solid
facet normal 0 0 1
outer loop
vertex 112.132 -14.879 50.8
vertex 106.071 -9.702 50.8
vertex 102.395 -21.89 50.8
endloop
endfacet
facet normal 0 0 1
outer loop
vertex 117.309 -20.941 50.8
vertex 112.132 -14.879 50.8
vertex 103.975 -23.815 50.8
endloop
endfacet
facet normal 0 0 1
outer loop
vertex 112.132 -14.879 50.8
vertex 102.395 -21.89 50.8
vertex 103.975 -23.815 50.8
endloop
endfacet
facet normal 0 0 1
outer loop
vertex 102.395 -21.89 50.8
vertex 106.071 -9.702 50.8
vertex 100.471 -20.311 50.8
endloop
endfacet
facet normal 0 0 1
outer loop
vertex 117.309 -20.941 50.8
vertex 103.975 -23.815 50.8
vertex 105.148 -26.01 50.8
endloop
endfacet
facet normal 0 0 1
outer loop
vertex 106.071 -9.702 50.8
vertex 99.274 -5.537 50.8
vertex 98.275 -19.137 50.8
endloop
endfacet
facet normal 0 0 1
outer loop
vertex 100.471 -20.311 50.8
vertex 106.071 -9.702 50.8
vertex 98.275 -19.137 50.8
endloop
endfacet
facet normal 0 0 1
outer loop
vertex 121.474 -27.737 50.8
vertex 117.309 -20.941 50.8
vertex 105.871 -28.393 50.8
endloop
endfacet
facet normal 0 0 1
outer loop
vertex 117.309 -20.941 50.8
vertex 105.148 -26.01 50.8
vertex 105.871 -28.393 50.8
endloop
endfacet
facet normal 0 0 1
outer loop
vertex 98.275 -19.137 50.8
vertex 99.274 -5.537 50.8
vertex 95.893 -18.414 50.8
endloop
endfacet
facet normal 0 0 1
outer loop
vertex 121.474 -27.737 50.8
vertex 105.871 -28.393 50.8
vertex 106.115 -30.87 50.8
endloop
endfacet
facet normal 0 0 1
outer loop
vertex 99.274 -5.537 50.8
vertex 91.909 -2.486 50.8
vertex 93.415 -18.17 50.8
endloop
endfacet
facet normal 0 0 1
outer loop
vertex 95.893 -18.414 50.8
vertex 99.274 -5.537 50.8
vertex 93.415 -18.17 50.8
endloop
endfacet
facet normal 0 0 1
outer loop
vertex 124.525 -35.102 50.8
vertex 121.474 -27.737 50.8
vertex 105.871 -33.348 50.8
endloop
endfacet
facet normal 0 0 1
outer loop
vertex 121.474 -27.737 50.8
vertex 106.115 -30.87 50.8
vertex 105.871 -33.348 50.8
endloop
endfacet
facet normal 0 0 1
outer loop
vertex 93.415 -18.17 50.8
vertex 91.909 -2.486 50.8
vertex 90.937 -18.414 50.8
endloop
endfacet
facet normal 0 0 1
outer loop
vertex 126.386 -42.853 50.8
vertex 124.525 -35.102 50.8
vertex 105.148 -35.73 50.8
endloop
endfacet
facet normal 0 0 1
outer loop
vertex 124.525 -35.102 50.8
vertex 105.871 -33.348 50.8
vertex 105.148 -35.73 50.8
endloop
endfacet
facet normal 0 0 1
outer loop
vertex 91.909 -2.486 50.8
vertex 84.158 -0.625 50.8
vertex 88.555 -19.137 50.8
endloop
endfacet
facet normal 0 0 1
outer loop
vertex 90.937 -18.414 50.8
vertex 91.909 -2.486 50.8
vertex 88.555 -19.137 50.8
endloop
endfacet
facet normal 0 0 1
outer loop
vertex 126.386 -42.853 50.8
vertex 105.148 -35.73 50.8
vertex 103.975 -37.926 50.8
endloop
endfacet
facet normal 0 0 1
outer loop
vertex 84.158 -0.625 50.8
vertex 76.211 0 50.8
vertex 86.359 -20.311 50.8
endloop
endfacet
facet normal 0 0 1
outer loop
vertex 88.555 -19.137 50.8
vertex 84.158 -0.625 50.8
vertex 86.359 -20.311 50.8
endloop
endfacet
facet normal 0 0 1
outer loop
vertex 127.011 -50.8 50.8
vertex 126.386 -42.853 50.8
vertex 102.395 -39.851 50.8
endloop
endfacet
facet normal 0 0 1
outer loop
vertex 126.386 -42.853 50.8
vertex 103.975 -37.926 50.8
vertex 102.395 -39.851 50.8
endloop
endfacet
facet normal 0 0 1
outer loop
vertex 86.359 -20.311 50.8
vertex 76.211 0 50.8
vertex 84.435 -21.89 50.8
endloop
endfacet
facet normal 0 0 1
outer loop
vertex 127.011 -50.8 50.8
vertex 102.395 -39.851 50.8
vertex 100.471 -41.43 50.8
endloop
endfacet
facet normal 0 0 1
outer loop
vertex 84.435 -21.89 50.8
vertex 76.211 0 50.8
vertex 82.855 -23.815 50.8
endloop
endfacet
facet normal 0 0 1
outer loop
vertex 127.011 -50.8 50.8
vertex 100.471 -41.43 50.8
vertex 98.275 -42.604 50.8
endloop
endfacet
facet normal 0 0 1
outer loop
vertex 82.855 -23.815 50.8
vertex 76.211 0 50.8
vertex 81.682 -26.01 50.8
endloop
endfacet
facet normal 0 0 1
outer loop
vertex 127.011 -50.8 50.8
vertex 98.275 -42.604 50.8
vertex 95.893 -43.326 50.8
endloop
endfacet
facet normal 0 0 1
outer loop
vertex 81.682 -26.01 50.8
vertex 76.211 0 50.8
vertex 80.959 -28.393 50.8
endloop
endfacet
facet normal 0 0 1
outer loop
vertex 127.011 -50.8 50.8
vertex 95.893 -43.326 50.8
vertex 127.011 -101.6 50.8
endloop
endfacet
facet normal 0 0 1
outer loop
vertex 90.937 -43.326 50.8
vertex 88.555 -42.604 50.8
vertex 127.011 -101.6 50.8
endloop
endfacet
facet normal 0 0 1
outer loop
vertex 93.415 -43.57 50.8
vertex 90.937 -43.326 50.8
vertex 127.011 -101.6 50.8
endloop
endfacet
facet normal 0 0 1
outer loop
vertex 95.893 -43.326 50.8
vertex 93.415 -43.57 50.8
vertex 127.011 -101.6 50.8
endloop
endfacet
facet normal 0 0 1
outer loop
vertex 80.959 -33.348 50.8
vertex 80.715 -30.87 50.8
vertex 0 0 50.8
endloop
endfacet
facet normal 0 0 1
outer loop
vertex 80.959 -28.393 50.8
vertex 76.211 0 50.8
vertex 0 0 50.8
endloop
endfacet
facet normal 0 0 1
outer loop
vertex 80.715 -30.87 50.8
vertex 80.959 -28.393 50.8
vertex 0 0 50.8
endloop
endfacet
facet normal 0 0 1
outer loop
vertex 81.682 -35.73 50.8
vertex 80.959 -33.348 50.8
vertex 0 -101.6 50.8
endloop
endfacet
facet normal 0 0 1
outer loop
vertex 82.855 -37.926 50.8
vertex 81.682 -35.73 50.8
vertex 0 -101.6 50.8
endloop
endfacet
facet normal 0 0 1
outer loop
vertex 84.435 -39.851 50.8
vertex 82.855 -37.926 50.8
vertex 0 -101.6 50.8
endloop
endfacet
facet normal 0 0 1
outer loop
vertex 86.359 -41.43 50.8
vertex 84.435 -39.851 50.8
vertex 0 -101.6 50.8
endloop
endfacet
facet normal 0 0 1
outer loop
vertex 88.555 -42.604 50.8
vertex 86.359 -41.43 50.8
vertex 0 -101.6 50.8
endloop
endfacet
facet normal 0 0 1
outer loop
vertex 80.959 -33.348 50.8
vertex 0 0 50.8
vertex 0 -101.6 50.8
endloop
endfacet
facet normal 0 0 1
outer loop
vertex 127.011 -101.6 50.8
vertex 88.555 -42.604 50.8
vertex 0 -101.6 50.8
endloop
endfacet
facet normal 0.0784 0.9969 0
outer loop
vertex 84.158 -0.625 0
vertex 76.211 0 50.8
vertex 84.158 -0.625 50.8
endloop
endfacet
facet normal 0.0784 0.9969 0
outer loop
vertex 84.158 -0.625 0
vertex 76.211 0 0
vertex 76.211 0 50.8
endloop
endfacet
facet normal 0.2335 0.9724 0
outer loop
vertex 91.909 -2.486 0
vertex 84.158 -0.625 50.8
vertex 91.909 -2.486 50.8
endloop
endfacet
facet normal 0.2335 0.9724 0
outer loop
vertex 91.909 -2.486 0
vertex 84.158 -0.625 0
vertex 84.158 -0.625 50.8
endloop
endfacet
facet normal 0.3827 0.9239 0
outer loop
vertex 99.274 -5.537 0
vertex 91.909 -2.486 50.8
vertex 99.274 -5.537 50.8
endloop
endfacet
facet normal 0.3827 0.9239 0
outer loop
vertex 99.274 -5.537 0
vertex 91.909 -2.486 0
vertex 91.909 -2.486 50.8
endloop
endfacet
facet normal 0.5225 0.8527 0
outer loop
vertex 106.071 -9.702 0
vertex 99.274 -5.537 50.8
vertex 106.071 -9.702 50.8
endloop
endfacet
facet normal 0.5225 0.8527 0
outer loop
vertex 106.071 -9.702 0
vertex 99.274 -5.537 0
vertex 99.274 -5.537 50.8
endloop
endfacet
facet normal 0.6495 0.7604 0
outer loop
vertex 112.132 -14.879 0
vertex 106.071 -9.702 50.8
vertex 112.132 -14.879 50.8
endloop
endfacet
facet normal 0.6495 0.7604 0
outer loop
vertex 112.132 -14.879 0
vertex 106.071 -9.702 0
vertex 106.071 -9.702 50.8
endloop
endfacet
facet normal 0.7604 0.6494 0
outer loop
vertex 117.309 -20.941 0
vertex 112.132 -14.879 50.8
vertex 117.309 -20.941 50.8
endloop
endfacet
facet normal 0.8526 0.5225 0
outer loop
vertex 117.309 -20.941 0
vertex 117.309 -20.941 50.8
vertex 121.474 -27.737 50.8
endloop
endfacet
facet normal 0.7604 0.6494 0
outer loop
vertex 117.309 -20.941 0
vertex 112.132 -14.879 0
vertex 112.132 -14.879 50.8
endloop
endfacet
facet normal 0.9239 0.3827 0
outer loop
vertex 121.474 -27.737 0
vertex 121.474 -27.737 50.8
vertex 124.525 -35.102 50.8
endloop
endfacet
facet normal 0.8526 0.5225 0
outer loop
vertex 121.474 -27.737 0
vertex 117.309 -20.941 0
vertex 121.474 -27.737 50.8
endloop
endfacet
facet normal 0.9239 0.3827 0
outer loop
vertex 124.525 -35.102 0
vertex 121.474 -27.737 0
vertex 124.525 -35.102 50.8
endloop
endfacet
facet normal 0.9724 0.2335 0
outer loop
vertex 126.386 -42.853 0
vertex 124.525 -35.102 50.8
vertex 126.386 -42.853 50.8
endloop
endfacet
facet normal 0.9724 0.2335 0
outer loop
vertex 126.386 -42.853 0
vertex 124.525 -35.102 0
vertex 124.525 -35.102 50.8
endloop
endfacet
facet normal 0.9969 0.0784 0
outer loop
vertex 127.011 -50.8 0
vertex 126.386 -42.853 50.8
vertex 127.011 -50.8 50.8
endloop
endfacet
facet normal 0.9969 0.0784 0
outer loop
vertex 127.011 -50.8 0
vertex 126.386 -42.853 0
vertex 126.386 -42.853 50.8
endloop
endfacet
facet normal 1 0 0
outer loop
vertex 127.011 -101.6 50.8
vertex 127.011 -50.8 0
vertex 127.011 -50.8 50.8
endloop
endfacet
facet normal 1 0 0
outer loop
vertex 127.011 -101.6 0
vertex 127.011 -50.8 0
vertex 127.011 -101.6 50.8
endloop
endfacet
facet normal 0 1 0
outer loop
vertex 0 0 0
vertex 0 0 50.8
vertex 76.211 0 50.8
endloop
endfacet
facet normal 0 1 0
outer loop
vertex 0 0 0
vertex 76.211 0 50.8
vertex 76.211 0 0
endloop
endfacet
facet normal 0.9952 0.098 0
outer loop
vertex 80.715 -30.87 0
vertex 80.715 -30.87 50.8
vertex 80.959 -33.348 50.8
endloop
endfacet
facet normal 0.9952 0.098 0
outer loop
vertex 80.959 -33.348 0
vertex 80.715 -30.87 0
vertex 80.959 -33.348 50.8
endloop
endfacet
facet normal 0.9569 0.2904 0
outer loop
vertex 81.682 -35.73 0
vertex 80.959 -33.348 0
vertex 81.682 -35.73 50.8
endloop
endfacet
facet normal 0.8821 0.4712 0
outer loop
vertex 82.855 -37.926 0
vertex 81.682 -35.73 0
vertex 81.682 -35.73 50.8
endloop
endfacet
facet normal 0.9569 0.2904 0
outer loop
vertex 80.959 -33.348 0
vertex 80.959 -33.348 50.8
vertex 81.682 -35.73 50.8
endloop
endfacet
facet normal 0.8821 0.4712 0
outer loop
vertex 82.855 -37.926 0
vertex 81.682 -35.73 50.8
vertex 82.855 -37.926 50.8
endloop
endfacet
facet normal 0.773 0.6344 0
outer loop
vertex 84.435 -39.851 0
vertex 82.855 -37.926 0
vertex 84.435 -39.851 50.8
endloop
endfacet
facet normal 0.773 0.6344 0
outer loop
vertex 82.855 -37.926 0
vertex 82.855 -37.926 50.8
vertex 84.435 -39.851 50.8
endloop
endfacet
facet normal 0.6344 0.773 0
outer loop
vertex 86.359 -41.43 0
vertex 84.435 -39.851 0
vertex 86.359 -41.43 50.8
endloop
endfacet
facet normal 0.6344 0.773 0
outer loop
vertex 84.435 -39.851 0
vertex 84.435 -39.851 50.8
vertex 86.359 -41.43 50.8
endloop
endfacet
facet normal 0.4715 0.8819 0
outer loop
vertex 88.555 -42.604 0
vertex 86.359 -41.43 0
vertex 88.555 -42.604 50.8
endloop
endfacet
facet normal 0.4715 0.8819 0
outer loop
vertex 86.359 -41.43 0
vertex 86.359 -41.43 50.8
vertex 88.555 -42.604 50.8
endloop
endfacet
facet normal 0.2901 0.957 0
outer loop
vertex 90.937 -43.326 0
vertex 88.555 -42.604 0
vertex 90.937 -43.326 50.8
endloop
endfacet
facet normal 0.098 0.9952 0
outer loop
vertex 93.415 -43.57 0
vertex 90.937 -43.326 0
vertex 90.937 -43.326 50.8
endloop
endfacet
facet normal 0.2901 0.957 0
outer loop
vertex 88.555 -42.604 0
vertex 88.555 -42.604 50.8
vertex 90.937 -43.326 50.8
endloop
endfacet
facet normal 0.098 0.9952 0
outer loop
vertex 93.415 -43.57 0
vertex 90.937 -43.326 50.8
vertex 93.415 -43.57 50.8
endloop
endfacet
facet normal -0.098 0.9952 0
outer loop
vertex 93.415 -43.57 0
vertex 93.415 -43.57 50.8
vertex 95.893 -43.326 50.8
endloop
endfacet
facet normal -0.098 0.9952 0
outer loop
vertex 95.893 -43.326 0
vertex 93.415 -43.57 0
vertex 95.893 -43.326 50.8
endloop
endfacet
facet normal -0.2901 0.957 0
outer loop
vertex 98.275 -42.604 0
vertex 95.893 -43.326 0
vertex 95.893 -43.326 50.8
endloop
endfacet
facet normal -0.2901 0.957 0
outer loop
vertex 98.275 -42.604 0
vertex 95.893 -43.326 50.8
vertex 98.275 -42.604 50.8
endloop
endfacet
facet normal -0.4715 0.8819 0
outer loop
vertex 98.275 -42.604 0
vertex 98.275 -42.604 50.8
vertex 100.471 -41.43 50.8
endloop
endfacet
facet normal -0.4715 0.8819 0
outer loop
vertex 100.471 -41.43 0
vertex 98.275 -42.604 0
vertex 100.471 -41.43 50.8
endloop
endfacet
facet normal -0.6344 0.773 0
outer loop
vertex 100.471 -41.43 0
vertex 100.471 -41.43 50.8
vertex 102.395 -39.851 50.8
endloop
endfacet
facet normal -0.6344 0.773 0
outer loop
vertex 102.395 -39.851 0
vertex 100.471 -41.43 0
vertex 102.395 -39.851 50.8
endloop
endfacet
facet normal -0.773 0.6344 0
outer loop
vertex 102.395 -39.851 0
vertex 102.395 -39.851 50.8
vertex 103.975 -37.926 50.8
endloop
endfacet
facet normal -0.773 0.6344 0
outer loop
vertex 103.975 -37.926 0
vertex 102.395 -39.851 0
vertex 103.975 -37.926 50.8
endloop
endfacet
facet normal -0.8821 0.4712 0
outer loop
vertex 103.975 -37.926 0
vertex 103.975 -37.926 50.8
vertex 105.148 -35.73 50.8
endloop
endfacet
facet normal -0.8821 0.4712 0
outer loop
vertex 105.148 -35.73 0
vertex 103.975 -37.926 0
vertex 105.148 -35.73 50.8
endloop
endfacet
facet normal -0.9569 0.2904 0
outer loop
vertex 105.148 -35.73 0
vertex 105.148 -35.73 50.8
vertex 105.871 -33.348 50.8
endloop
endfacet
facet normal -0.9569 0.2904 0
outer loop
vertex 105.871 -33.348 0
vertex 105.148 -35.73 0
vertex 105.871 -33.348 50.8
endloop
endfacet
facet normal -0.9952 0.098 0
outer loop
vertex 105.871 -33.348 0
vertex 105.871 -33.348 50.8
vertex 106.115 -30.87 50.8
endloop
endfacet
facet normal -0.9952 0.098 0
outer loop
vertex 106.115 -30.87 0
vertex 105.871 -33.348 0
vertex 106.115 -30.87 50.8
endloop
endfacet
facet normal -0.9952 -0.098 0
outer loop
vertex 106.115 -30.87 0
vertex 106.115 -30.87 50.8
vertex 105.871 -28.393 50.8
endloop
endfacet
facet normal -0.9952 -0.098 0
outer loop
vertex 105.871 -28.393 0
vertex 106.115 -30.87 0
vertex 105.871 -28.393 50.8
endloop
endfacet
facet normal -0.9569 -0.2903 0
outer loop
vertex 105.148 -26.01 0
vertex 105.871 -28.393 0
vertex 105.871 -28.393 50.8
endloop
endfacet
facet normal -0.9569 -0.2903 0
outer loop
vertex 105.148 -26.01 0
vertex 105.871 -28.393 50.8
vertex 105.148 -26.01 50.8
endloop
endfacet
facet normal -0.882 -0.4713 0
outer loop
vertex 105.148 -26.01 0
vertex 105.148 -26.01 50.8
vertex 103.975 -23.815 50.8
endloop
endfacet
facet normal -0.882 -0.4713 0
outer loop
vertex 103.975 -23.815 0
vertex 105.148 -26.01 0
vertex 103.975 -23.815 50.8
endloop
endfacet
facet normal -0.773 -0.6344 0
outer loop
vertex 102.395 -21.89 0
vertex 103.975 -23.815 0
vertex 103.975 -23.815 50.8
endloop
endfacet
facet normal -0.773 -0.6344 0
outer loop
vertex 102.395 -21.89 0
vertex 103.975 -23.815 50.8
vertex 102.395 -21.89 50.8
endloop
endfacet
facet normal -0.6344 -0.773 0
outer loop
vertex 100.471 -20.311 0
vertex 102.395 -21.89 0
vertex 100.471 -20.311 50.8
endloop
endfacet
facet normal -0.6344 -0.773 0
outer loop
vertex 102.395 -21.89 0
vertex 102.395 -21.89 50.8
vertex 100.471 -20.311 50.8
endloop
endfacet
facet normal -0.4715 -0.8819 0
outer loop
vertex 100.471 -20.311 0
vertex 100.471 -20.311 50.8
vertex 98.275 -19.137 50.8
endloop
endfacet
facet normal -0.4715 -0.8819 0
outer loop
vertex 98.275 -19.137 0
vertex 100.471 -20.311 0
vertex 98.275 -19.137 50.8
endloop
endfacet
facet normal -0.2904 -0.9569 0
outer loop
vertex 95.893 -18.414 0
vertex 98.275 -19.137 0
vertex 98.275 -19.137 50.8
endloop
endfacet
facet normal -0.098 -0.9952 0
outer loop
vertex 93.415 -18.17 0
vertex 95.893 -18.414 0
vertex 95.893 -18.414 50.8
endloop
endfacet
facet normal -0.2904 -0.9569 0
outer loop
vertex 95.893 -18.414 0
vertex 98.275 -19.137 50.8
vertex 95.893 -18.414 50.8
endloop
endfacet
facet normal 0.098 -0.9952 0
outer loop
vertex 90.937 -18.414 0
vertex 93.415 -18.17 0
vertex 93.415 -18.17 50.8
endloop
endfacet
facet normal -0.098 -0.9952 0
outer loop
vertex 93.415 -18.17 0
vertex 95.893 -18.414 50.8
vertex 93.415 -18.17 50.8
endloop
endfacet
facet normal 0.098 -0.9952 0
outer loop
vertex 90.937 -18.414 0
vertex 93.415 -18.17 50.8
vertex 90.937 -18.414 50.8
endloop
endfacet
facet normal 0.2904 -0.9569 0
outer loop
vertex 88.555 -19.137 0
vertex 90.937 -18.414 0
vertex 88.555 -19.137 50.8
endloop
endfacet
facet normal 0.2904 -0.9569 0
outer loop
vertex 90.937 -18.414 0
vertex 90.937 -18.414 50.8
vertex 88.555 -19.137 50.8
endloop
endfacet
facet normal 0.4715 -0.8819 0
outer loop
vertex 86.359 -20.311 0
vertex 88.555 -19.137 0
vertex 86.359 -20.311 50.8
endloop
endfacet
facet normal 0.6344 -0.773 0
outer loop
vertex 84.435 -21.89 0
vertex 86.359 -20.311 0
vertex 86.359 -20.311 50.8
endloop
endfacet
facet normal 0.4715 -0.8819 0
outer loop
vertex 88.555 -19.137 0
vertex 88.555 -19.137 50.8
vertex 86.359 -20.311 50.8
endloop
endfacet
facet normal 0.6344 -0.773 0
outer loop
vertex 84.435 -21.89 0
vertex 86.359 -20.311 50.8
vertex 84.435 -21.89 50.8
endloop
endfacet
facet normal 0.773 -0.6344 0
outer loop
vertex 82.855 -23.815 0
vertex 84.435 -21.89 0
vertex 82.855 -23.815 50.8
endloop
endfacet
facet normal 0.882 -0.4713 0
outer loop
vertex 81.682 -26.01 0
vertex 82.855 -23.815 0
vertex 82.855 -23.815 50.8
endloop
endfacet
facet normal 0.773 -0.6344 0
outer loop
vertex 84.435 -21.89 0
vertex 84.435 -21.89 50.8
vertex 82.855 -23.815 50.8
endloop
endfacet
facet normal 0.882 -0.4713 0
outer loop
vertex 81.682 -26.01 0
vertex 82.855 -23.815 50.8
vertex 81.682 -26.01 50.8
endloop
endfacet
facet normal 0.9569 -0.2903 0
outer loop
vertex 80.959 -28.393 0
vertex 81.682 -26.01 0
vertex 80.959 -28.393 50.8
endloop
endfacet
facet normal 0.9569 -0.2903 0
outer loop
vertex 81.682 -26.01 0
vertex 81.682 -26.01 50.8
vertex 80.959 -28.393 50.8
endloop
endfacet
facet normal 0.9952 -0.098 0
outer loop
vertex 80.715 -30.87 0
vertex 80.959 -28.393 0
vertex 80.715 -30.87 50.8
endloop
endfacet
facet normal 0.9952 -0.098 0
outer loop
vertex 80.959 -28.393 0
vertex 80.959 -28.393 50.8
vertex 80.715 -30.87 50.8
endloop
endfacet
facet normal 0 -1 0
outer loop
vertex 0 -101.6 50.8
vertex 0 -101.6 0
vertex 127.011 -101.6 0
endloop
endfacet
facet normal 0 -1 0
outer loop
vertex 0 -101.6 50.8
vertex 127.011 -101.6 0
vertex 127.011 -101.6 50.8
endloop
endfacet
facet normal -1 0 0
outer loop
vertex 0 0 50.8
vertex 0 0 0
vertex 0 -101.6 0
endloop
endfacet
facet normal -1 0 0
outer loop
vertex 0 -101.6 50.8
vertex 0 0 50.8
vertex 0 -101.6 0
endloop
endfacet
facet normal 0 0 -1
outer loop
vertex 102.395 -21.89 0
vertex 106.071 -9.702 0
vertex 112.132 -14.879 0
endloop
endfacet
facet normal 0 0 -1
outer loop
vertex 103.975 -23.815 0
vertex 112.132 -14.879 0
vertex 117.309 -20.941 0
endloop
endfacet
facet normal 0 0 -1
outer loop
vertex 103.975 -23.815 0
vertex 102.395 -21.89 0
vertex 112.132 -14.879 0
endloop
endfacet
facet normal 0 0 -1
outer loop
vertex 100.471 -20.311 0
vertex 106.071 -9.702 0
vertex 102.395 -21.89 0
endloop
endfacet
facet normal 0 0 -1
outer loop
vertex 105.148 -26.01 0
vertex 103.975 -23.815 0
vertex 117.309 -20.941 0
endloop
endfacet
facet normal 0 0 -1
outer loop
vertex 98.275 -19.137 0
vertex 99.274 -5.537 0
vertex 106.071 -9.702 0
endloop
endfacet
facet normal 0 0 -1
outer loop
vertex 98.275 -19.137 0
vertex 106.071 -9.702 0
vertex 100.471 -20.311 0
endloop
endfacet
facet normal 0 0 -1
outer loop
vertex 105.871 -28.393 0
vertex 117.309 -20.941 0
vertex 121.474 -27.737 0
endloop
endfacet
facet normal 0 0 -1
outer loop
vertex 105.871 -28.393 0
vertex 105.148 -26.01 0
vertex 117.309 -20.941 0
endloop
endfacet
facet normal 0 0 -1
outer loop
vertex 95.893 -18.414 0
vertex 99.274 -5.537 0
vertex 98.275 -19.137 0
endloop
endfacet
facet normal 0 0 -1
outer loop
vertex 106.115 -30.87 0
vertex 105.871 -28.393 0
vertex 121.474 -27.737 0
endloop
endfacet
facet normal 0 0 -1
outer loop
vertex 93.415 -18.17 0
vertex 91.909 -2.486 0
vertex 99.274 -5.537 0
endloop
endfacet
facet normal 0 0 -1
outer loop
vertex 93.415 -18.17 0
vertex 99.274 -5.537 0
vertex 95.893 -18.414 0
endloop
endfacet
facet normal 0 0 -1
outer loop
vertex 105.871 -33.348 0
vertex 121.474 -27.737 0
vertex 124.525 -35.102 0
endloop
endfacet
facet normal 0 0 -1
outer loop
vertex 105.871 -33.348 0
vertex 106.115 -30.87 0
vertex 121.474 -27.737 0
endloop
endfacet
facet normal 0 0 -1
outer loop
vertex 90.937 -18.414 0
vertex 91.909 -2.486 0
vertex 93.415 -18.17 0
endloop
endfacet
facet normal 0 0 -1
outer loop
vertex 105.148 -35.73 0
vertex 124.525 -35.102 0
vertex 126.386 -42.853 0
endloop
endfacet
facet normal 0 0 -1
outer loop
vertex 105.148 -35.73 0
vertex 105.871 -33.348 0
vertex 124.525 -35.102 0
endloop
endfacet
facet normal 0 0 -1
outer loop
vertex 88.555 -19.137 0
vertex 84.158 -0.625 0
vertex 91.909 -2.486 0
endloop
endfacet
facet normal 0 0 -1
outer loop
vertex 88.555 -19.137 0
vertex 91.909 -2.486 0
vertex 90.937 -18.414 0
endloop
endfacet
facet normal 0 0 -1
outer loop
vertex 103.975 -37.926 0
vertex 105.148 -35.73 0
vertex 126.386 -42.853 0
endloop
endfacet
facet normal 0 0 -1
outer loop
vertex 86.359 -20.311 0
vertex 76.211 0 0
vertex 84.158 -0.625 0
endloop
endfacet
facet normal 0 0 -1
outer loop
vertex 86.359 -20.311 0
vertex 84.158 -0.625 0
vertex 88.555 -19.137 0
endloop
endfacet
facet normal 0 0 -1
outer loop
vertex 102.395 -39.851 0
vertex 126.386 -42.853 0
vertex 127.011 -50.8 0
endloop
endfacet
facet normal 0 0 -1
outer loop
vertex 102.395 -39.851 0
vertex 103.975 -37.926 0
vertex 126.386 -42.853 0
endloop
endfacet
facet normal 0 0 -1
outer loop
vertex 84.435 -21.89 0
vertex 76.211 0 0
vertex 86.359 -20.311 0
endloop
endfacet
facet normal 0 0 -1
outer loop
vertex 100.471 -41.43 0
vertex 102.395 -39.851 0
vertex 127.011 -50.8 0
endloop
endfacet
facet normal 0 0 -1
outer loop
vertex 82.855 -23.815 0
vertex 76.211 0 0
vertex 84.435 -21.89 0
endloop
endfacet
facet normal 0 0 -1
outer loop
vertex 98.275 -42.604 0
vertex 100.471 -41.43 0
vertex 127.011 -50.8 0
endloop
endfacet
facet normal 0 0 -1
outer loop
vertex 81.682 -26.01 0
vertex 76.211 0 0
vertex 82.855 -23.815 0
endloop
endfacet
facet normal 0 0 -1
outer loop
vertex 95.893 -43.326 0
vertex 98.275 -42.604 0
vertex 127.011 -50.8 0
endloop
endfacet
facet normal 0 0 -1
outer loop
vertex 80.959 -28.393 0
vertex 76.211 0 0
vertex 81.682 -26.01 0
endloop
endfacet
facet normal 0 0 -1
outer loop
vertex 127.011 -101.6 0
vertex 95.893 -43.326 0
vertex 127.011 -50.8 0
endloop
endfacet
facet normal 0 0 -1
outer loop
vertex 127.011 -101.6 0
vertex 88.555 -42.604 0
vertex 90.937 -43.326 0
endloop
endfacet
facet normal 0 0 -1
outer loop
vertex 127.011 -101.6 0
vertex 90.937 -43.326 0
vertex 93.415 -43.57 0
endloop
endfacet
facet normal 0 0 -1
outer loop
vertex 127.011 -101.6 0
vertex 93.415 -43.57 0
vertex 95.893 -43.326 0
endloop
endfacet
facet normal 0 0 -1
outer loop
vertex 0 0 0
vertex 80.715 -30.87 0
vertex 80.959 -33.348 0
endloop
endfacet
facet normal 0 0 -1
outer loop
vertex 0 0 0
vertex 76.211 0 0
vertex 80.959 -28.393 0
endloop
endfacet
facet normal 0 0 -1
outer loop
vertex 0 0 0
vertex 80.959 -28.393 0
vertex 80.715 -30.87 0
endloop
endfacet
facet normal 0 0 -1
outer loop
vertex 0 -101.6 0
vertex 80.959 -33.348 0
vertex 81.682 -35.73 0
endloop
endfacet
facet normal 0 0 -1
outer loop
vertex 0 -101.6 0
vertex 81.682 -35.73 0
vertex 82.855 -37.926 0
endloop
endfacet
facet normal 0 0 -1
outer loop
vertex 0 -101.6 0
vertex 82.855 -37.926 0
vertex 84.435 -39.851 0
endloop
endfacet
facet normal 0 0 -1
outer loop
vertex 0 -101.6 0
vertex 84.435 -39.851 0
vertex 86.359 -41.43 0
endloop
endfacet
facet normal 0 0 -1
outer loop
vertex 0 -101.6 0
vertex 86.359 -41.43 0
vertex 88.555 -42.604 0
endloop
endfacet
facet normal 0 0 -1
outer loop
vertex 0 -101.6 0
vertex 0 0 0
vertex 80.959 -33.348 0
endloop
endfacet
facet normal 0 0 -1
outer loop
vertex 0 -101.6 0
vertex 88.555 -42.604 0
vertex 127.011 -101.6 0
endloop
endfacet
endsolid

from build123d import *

# Parameters (mm, degrees)
F0_W     = 77.6591151953
F0_H     = 11.8106603622
F1_DEPTH = 101.6
F2_DEPTH = 38.989
F3_DEPTH = 1.4478
F4_DEPTH = 50.8
F5_R     = 50.8
F7_D     = 25.4


with BuildPart() as f1:
    # F0 (on Front) → F1 (new body)
    with BuildSketch(Plane.XZ):
        with Locations((38.8295575976, 5.9053301811)):
            Rectangle(F0_W, F0_H)
    extrude(amount=F1_DEPTH)

    # F2 (add): a face of the model
    f2_faces = [f1.faces().sort_by_distance(p)[0] for p in [
        (38.8295575976, -50.8, 11.8106603622),
    ]]
    extrude(f2_faces, amount=F2_DEPTH)

    # F3 (cut): a face of the model
    f3_faces = [f1.faces().sort_by_distance(p)[0] for p in [
        (77.6591151953, -50.8, 25.3998301811),
    ]]
    extrude(f3_faces, amount=-F3_DEPTH, mode=Mode.SUBTRACT)

    # F4 (add): a face of the model
    f4_faces = [f1.faces().sort_by_distance(p)[0] for p in [
        (76.2113151953, -50.8, 25.3998301811),
    ]]
    extrude(f4_faces, amount=F4_DEPTH)

    # F5
    f5_edges = [f1.edges().sort_by_distance(p)[0] for p in [
        (127.011315, 0, 25.39983),
    ]]
    fillet(f5_edges, radius=F5_R)

    # F7 (through all)
    with Locations(Plane(origin=(0, 0, 0), x_dir=(1, 0, 0), z_dir=(0, 0, -1))):
        with Locations((93.4151336551, 30.8703370392)):
            Hole(F7_D / 2)


solid = f1.part
